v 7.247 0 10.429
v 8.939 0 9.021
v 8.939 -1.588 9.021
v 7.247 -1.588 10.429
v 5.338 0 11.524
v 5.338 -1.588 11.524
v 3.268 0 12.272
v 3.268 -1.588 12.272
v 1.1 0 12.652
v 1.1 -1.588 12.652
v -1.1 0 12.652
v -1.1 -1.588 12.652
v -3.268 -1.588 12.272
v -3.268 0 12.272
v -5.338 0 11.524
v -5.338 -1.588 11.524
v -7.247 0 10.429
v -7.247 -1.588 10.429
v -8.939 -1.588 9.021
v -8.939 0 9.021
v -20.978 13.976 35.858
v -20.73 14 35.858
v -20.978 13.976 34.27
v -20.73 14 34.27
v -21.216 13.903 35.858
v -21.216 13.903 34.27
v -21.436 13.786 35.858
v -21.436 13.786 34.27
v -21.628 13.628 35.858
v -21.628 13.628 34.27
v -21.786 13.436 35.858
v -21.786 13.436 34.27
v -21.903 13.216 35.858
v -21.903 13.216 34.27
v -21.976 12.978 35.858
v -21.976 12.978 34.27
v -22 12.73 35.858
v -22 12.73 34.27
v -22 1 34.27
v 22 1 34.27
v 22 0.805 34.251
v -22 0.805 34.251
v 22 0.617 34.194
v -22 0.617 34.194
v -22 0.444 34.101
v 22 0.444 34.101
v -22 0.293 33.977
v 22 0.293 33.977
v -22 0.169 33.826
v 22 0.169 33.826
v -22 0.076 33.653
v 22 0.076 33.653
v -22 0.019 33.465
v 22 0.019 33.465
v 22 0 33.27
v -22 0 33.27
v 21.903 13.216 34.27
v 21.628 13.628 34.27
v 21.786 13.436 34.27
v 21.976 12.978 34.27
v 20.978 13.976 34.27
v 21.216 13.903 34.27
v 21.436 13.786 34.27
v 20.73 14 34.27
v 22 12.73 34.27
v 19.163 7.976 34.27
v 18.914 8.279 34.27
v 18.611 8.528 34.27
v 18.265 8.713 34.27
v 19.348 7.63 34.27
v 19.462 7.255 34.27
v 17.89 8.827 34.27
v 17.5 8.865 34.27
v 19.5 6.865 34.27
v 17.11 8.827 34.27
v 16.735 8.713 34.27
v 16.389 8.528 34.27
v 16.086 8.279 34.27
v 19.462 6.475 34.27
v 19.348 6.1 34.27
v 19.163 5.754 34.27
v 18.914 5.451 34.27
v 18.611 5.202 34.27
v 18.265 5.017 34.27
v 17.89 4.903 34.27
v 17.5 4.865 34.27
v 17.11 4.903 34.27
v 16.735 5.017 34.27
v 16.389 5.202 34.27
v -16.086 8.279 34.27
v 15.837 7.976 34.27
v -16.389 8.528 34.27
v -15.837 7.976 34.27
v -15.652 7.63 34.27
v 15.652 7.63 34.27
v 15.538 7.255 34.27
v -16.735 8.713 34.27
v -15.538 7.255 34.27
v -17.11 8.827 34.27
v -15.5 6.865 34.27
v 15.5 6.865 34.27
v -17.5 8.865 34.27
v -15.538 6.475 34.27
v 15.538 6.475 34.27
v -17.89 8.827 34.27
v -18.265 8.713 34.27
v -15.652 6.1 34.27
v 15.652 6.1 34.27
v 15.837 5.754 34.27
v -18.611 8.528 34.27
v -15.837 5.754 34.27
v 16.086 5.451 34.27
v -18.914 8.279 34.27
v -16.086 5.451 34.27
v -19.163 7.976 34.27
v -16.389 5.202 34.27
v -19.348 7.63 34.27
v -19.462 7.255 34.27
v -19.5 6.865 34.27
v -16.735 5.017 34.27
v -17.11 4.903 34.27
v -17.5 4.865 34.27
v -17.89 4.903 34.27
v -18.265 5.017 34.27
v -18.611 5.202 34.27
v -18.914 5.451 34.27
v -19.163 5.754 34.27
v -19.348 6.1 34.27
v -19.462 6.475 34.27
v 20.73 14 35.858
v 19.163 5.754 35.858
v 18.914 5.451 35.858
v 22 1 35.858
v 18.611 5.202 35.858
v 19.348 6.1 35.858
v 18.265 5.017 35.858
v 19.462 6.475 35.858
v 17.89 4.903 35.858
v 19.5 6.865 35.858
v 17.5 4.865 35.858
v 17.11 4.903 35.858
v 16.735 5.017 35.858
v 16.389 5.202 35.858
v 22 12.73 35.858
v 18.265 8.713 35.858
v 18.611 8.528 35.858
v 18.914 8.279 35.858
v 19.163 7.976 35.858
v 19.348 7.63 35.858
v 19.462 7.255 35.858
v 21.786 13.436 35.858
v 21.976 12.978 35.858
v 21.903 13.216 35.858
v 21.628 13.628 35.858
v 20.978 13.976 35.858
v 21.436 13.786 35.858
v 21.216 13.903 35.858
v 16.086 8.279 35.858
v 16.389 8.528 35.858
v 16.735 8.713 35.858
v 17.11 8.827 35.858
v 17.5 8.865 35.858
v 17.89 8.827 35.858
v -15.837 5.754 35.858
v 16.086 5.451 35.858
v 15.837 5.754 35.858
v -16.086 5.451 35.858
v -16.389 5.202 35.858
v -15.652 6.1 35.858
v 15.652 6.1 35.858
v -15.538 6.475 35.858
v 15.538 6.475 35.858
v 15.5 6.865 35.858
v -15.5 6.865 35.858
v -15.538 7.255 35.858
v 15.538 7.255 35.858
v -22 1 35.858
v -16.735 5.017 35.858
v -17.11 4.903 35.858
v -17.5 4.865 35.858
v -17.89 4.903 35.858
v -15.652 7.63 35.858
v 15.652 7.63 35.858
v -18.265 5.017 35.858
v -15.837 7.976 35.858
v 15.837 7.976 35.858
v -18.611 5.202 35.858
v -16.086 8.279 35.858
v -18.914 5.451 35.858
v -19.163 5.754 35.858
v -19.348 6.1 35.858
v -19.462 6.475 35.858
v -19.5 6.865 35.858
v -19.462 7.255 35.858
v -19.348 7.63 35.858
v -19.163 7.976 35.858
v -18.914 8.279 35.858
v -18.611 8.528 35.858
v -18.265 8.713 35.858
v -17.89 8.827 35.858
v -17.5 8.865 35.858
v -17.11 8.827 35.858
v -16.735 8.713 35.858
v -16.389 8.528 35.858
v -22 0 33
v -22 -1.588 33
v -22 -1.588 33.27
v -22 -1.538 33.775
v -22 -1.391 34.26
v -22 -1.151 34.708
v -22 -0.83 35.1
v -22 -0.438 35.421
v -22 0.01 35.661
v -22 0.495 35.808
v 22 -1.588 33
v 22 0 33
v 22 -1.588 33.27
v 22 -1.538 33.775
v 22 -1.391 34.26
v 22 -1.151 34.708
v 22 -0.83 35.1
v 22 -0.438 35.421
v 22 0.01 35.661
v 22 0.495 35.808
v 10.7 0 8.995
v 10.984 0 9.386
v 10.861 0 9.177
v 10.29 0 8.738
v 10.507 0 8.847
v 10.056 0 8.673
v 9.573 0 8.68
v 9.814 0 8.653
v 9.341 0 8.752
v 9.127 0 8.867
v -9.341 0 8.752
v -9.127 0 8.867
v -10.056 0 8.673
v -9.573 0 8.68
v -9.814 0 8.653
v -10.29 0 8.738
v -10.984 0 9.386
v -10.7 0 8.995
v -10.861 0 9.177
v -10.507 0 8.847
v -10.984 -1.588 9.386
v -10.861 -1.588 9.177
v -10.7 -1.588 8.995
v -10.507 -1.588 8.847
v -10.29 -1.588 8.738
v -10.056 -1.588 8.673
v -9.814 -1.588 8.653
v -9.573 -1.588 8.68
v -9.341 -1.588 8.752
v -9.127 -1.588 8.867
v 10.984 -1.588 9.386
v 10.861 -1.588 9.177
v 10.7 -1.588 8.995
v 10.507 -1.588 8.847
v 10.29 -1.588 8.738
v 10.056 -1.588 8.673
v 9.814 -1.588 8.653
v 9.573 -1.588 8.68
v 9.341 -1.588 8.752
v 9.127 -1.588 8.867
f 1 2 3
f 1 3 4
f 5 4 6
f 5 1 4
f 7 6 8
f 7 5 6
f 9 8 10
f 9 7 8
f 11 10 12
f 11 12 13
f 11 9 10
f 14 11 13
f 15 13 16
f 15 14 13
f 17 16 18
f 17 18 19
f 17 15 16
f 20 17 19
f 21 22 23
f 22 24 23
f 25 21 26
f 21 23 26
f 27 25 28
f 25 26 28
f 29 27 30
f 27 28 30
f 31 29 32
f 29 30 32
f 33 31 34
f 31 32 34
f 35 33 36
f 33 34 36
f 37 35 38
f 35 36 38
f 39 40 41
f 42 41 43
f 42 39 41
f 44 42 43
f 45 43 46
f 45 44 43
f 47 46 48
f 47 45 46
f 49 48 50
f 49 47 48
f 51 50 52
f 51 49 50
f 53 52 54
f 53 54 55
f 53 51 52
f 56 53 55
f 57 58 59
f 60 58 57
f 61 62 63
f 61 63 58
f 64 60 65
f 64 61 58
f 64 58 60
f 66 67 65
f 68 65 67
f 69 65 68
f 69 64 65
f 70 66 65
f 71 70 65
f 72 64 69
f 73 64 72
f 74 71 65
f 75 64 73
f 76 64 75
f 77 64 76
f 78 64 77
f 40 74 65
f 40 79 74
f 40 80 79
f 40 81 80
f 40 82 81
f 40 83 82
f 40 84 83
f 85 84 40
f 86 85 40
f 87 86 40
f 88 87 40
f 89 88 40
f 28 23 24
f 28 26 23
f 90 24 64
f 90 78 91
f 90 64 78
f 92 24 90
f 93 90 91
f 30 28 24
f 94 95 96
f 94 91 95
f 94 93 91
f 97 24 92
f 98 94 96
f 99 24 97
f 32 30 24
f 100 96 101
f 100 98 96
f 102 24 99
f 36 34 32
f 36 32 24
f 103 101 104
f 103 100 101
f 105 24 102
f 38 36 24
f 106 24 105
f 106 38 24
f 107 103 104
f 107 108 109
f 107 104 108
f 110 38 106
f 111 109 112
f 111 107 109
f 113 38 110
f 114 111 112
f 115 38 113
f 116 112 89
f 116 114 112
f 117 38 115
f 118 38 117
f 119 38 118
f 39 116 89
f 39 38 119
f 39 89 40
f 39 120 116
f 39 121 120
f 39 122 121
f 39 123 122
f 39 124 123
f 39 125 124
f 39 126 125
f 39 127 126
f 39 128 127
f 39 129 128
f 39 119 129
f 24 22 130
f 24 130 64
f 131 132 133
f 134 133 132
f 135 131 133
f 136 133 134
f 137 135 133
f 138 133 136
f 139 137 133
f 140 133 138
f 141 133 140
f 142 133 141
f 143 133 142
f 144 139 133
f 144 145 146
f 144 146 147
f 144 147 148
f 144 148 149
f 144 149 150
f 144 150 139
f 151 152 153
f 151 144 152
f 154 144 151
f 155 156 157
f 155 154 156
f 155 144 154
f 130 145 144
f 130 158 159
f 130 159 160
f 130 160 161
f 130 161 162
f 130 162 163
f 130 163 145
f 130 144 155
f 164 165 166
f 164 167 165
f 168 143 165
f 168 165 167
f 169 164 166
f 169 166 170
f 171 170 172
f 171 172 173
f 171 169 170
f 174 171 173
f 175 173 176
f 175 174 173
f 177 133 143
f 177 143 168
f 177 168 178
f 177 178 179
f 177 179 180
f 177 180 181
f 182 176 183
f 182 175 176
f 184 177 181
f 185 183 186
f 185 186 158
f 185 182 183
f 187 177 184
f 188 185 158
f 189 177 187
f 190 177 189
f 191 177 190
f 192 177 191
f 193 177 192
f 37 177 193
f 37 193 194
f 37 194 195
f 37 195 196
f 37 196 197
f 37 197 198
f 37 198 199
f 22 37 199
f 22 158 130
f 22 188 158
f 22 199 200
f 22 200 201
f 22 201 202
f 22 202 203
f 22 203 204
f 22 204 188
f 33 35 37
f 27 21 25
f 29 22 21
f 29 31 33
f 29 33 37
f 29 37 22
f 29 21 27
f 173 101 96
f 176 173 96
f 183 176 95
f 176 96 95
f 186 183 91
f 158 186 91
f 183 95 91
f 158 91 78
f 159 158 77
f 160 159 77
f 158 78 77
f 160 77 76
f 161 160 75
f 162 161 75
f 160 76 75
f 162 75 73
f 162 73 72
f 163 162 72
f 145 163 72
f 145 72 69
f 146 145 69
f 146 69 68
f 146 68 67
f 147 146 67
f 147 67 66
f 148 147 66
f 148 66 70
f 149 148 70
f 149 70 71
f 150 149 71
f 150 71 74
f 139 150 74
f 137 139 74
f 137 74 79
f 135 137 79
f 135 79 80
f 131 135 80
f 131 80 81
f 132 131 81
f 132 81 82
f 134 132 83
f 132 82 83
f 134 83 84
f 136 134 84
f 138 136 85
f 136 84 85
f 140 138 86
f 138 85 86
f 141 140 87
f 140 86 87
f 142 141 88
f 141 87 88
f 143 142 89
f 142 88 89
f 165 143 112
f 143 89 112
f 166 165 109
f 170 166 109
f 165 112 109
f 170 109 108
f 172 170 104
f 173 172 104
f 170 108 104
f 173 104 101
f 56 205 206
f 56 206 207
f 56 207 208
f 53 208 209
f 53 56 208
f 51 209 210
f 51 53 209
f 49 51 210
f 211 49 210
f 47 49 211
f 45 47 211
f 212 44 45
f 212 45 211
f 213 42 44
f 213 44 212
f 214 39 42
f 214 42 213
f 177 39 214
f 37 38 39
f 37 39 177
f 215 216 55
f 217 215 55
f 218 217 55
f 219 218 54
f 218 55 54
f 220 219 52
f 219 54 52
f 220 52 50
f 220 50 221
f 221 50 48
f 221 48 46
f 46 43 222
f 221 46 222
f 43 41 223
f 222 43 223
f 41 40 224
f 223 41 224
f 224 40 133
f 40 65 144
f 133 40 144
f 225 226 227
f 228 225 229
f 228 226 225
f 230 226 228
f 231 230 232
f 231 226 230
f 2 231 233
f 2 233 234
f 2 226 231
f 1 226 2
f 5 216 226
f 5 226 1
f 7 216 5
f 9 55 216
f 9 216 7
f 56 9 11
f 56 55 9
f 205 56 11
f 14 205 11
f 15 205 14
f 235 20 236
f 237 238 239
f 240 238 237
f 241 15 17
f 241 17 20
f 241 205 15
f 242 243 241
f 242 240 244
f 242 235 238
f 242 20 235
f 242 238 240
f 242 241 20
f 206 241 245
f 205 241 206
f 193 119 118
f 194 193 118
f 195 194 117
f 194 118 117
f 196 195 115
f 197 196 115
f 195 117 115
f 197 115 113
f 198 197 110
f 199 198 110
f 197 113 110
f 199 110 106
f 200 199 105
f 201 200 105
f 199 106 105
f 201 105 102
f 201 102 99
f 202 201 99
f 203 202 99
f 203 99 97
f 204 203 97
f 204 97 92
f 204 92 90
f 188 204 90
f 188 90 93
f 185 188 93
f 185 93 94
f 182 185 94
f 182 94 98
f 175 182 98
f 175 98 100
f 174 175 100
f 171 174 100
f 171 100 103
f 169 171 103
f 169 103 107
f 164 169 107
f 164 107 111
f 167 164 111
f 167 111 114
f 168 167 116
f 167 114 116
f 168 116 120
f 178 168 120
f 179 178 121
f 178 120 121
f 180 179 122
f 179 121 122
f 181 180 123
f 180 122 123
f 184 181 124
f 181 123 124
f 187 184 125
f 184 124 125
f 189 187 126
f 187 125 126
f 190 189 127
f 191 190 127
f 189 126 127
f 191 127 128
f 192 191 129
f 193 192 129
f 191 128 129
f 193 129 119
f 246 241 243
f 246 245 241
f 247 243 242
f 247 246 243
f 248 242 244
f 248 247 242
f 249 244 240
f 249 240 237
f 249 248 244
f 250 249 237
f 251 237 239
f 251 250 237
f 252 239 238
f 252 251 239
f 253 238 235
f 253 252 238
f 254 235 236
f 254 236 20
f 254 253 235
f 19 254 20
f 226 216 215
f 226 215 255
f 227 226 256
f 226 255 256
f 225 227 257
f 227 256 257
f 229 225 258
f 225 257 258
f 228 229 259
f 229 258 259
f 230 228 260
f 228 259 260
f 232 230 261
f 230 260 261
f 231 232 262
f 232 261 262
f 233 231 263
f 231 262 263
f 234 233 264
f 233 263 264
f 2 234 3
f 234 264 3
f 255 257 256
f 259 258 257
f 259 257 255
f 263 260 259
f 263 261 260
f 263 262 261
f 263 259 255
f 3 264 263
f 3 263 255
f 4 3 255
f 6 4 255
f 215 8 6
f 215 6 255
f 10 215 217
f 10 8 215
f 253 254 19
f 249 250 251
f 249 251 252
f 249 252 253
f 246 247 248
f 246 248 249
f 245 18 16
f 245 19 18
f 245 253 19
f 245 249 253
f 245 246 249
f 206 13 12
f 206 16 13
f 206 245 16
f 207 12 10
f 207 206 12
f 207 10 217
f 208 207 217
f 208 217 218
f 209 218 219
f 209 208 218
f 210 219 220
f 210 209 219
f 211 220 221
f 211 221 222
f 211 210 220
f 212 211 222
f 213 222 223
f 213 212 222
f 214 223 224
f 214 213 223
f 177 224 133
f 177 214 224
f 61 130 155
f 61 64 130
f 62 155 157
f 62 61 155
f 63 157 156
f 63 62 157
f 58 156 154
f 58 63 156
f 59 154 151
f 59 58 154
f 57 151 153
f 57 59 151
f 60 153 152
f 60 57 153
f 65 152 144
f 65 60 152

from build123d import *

# Parameters (mm, degrees)
BASE_FLANGE2_DEPTH = 1.5875
EDGE_FLANGE2_DEPTH = 43.999999884
FILLET2_R          = 1.27
SKETCH21_R         = 2
CUT_EXTRUDE1_DEPTH = 37.554305105


# Sheet-metal steps are written as plain solids
with BuildPart() as part:
    # Sketch12 → Base-Flange2 (new body)
    with BuildSketch(Plane(origin=(0, 0, 0), x_dir=(1, 0, 0), z_dir=(0, 1, 0))):
        with BuildLine():
            Line((-21.999999942, -33), (0, -33))
            Line((0, -33), (21.999999942, -33))
            Line((21.999999942, -33), (10.16, -7.62))
            ThreePointArc((10.16, -7.62), (0, -12.7), (-10.16, -7.62))
            Line((-10.16, -7.62), (-21.999999942, -33))
        make_face()
    extrude(amount=-BASE_FLANGE2_DEPTH)

    # Edge-Flange2 section (across the edge) → Edge-Flange2 (add)
    with BuildSketch(Plane(origin=(-21.999999942, 0, 34.27), x_dir=(0, 0, -1), z_dir=(1, 0, 0))):
        with BuildLine():
            Line((-1.5875, 1), (-1.5875, 14))
            Line((-1.5875, 14), (0, 14))
            Line((0, 14), (0, 1))
            ThreePointArc((0, 1), (0.292893219, 0.292893219), (1, 0))
            Line((1, 0), (1.27, 0))
            Line((1.27, 0), (1.27, -1.5875))
            Line((1.27, -1.5875), (1, -1.5875))
            ThreePointArc((1, -1.5875), (-0.829638796, -0.829638796), (-1.5875, 1))
        make_face()
    extrude(amount=EDGE_FLANGE2_DEPTH)

    # Fillet2
    fillet2_edges = [part.edges().sort_by_distance(p)[0] for p in [
        (-21.999999942, 14, 35.06375),
        (21.999999942, 14, 35.06375),
        (-10.16, -0.79375, 7.62),
        (10.16, -0.79375, 7.62),
    ]]
    fillet(fillet2_edges, radius=FILLET2_R)

    # Sketch21 → Cut-Extrude1 (cut, through all)
    with BuildSketch(Plane(origin=(0, 0, 34.27), x_dir=(-1, 0, 0), z_dir=(0, 0, -1))):
        with Locations((-17.5, 6.865)):
            Circle(SKETCH21_R)
        with Locations((17.5, 6.865)):
            Circle(SKETCH21_R)
    extrude(amount=-CUT_EXTRUDE1_DEPTH, mode=Mode.SUBTRACT)


solid = part.part
